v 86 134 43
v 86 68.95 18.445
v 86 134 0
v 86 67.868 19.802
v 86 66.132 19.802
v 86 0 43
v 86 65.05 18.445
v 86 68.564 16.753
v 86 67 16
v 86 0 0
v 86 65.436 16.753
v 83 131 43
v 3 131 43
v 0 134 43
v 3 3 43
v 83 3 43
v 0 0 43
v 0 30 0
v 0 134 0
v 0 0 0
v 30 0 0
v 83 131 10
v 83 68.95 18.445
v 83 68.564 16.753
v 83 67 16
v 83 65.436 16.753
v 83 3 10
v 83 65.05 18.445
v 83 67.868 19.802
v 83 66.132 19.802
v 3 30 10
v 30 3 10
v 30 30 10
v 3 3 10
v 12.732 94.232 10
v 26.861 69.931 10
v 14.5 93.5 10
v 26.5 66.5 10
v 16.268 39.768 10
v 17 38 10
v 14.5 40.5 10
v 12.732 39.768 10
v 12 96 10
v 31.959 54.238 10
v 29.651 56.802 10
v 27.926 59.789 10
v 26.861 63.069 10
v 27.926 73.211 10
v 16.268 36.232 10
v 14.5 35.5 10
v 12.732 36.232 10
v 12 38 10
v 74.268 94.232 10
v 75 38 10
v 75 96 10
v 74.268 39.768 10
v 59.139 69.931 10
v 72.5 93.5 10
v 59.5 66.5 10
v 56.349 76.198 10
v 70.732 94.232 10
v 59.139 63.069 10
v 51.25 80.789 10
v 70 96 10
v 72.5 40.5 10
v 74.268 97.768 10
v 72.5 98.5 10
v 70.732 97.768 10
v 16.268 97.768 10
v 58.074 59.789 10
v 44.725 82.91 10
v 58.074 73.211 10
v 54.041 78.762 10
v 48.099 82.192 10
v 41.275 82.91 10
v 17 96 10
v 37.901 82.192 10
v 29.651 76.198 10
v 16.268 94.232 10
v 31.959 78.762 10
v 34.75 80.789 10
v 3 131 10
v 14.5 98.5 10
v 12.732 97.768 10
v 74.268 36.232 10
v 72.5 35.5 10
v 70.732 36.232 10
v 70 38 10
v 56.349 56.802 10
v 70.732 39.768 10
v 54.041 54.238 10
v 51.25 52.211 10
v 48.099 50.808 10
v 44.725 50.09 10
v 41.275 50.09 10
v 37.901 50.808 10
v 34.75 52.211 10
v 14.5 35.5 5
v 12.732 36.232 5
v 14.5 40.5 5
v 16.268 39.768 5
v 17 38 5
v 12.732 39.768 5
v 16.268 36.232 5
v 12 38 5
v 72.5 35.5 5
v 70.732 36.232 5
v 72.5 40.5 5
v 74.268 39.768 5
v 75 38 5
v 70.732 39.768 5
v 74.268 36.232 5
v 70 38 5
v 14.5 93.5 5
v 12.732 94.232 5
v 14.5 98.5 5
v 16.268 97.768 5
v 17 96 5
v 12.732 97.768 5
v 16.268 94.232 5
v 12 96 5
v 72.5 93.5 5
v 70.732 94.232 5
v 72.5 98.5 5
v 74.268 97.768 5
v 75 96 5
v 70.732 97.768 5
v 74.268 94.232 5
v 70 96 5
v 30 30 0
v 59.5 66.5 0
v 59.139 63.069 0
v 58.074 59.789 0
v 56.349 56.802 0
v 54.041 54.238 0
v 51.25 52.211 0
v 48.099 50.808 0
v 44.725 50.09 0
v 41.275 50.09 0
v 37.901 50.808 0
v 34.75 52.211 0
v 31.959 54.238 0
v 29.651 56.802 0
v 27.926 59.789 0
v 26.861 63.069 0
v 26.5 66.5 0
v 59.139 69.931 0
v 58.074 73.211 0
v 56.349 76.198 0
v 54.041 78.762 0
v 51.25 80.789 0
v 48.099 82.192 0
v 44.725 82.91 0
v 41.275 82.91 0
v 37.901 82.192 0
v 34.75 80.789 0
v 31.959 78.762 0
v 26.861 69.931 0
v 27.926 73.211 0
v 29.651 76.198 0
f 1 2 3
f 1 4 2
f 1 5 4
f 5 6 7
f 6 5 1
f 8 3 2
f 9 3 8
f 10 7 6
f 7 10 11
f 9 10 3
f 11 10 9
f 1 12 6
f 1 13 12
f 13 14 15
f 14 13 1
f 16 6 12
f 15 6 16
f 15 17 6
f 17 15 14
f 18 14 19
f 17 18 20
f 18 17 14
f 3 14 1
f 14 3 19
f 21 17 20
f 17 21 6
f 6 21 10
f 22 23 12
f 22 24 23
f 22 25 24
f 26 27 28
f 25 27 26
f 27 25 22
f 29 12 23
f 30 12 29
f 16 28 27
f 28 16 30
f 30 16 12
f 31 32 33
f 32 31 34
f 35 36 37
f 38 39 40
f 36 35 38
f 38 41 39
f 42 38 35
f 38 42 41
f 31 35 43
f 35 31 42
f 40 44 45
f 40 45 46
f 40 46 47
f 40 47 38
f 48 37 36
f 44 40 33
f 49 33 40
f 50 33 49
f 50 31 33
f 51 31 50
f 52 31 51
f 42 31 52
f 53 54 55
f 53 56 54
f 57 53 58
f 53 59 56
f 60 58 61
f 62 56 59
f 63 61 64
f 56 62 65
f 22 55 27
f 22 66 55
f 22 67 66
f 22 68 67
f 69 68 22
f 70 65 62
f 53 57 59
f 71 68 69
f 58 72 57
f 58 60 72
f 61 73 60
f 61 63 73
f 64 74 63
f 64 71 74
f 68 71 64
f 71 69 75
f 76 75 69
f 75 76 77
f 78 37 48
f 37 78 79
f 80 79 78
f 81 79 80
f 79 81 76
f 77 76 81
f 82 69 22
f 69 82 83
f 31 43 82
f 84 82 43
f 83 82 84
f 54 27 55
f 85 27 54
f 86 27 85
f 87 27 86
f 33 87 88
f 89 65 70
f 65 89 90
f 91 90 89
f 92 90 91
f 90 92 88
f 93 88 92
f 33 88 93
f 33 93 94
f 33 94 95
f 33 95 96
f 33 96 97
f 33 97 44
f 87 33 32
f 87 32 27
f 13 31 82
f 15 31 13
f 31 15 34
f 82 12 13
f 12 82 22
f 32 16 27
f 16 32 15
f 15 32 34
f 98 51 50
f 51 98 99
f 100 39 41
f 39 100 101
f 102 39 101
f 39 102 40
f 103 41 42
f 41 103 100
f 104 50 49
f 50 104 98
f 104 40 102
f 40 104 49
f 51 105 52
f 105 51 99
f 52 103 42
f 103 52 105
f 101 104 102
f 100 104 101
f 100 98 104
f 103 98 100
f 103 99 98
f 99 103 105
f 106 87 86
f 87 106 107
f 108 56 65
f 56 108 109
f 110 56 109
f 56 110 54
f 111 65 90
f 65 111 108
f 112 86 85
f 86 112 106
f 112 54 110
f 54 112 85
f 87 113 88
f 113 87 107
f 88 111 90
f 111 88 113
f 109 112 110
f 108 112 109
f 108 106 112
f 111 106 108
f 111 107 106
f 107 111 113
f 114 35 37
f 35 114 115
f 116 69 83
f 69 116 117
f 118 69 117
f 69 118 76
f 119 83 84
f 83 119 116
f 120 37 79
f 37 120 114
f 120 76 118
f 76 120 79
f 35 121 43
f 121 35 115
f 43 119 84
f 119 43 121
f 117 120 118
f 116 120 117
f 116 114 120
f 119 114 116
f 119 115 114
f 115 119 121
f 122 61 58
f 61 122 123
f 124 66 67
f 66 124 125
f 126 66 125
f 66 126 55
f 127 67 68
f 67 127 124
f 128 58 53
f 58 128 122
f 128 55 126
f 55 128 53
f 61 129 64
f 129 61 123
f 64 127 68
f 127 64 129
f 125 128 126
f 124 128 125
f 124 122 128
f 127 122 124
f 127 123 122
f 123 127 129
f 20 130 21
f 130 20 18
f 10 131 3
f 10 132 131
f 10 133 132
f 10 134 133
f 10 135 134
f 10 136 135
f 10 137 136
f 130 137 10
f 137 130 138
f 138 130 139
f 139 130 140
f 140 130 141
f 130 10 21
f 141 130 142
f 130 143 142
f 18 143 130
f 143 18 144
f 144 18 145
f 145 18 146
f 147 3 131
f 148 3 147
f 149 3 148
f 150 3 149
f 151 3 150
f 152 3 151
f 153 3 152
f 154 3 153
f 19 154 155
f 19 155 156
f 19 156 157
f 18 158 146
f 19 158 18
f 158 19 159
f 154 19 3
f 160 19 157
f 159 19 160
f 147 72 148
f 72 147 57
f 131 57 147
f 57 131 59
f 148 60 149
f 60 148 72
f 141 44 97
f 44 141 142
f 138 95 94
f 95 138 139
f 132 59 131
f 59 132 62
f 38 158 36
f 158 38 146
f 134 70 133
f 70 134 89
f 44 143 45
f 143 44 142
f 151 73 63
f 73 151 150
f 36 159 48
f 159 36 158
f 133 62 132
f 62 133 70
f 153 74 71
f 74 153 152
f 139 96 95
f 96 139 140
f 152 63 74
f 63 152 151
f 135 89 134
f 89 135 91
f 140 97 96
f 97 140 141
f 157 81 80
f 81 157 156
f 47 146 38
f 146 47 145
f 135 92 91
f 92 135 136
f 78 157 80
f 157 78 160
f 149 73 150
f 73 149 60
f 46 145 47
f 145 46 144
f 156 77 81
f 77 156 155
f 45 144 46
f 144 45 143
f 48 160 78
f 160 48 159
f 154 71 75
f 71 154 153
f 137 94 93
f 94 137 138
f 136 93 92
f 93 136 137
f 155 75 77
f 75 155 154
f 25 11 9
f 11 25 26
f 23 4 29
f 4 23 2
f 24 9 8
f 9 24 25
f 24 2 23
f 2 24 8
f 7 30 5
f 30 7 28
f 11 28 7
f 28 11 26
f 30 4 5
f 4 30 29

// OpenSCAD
// file: speaker_cabinet.scad
u=12;
margin=5;
border=2;

difference() {
    union() {
        cube([u*6+margin*2+border*2,u*10+margin*2+border*2,55]);
    };
    
    //main cutout
    translate([3,3,22]) {
        cube([u*6+margin*2+border*2-6,u*10+margin*2+border*2-6,33]);
    };
    
    //speaker stands
    translate([(87-58)/2,(134-58)/2,17]) {
        cylinder(h=8, d=5);
    }
    translate([(87-58)/2+58,(134-58)/2,17]) {
        cylinder(h=8, d=5);
    }
    translate([(87-58)/2,(134-58)/2+58,17]) {
        cylinder(h=8, d=5);
    }
    translate([(87-58)/2+58,(134-58)/2+58,17]) {
        cylinder(h=8, d=5);
    }    
    
    //back mounting bracket
    translate([10,10,0]) {
        cylinder(h=8, d=5);
    }
    translate([u*6+margin*2+border*2-10,10,0]) {
        cylinder(h=8, d=5);
    }
    translate([10,u*10+margin*2+border*2-10,0]) {
        cylinder(h=8, d=5);
    }
    translate([u*6+margin*2+border*2-10,u*10+margin*2+border*2-10,0]) {
        cylinder(h=8, d=5);
    }
    
    //power cutout
    translate([0,15,10]) {
        cube([15,9.3,11.2]);        
    }    
    //power cutout pins
    translate([6,15,6]) {
        cube([9,9.3,4]);
    }    
    //power cable run
    translate([15,15,10]) {
        cube([86-14.5,9.3,2]);        
    }    
    
    //speaker magnet
    translate([87/2-33/2+16,134/2-33/2+16,12]) {
        cylinder(h=10,d=33);
    }
    
    //speaker wire conduit
    translate([u*6+margin*2+border*2-5,134/2,30]) {
        rotate(90,[0,1,0]) {
            cylinder(h=15,d=4);
        }
    }
};

// speaker stand 4mm diameter, 58mm apart
//87x134mm
// main file
difference() {
    translate([0,0,-12]) {
        include <speaker_cabinet.scad>;
    }
    translate([-1,-1,-12]) {
        cube([200,200,12]);
    };
}

cube([30,30,10]);
